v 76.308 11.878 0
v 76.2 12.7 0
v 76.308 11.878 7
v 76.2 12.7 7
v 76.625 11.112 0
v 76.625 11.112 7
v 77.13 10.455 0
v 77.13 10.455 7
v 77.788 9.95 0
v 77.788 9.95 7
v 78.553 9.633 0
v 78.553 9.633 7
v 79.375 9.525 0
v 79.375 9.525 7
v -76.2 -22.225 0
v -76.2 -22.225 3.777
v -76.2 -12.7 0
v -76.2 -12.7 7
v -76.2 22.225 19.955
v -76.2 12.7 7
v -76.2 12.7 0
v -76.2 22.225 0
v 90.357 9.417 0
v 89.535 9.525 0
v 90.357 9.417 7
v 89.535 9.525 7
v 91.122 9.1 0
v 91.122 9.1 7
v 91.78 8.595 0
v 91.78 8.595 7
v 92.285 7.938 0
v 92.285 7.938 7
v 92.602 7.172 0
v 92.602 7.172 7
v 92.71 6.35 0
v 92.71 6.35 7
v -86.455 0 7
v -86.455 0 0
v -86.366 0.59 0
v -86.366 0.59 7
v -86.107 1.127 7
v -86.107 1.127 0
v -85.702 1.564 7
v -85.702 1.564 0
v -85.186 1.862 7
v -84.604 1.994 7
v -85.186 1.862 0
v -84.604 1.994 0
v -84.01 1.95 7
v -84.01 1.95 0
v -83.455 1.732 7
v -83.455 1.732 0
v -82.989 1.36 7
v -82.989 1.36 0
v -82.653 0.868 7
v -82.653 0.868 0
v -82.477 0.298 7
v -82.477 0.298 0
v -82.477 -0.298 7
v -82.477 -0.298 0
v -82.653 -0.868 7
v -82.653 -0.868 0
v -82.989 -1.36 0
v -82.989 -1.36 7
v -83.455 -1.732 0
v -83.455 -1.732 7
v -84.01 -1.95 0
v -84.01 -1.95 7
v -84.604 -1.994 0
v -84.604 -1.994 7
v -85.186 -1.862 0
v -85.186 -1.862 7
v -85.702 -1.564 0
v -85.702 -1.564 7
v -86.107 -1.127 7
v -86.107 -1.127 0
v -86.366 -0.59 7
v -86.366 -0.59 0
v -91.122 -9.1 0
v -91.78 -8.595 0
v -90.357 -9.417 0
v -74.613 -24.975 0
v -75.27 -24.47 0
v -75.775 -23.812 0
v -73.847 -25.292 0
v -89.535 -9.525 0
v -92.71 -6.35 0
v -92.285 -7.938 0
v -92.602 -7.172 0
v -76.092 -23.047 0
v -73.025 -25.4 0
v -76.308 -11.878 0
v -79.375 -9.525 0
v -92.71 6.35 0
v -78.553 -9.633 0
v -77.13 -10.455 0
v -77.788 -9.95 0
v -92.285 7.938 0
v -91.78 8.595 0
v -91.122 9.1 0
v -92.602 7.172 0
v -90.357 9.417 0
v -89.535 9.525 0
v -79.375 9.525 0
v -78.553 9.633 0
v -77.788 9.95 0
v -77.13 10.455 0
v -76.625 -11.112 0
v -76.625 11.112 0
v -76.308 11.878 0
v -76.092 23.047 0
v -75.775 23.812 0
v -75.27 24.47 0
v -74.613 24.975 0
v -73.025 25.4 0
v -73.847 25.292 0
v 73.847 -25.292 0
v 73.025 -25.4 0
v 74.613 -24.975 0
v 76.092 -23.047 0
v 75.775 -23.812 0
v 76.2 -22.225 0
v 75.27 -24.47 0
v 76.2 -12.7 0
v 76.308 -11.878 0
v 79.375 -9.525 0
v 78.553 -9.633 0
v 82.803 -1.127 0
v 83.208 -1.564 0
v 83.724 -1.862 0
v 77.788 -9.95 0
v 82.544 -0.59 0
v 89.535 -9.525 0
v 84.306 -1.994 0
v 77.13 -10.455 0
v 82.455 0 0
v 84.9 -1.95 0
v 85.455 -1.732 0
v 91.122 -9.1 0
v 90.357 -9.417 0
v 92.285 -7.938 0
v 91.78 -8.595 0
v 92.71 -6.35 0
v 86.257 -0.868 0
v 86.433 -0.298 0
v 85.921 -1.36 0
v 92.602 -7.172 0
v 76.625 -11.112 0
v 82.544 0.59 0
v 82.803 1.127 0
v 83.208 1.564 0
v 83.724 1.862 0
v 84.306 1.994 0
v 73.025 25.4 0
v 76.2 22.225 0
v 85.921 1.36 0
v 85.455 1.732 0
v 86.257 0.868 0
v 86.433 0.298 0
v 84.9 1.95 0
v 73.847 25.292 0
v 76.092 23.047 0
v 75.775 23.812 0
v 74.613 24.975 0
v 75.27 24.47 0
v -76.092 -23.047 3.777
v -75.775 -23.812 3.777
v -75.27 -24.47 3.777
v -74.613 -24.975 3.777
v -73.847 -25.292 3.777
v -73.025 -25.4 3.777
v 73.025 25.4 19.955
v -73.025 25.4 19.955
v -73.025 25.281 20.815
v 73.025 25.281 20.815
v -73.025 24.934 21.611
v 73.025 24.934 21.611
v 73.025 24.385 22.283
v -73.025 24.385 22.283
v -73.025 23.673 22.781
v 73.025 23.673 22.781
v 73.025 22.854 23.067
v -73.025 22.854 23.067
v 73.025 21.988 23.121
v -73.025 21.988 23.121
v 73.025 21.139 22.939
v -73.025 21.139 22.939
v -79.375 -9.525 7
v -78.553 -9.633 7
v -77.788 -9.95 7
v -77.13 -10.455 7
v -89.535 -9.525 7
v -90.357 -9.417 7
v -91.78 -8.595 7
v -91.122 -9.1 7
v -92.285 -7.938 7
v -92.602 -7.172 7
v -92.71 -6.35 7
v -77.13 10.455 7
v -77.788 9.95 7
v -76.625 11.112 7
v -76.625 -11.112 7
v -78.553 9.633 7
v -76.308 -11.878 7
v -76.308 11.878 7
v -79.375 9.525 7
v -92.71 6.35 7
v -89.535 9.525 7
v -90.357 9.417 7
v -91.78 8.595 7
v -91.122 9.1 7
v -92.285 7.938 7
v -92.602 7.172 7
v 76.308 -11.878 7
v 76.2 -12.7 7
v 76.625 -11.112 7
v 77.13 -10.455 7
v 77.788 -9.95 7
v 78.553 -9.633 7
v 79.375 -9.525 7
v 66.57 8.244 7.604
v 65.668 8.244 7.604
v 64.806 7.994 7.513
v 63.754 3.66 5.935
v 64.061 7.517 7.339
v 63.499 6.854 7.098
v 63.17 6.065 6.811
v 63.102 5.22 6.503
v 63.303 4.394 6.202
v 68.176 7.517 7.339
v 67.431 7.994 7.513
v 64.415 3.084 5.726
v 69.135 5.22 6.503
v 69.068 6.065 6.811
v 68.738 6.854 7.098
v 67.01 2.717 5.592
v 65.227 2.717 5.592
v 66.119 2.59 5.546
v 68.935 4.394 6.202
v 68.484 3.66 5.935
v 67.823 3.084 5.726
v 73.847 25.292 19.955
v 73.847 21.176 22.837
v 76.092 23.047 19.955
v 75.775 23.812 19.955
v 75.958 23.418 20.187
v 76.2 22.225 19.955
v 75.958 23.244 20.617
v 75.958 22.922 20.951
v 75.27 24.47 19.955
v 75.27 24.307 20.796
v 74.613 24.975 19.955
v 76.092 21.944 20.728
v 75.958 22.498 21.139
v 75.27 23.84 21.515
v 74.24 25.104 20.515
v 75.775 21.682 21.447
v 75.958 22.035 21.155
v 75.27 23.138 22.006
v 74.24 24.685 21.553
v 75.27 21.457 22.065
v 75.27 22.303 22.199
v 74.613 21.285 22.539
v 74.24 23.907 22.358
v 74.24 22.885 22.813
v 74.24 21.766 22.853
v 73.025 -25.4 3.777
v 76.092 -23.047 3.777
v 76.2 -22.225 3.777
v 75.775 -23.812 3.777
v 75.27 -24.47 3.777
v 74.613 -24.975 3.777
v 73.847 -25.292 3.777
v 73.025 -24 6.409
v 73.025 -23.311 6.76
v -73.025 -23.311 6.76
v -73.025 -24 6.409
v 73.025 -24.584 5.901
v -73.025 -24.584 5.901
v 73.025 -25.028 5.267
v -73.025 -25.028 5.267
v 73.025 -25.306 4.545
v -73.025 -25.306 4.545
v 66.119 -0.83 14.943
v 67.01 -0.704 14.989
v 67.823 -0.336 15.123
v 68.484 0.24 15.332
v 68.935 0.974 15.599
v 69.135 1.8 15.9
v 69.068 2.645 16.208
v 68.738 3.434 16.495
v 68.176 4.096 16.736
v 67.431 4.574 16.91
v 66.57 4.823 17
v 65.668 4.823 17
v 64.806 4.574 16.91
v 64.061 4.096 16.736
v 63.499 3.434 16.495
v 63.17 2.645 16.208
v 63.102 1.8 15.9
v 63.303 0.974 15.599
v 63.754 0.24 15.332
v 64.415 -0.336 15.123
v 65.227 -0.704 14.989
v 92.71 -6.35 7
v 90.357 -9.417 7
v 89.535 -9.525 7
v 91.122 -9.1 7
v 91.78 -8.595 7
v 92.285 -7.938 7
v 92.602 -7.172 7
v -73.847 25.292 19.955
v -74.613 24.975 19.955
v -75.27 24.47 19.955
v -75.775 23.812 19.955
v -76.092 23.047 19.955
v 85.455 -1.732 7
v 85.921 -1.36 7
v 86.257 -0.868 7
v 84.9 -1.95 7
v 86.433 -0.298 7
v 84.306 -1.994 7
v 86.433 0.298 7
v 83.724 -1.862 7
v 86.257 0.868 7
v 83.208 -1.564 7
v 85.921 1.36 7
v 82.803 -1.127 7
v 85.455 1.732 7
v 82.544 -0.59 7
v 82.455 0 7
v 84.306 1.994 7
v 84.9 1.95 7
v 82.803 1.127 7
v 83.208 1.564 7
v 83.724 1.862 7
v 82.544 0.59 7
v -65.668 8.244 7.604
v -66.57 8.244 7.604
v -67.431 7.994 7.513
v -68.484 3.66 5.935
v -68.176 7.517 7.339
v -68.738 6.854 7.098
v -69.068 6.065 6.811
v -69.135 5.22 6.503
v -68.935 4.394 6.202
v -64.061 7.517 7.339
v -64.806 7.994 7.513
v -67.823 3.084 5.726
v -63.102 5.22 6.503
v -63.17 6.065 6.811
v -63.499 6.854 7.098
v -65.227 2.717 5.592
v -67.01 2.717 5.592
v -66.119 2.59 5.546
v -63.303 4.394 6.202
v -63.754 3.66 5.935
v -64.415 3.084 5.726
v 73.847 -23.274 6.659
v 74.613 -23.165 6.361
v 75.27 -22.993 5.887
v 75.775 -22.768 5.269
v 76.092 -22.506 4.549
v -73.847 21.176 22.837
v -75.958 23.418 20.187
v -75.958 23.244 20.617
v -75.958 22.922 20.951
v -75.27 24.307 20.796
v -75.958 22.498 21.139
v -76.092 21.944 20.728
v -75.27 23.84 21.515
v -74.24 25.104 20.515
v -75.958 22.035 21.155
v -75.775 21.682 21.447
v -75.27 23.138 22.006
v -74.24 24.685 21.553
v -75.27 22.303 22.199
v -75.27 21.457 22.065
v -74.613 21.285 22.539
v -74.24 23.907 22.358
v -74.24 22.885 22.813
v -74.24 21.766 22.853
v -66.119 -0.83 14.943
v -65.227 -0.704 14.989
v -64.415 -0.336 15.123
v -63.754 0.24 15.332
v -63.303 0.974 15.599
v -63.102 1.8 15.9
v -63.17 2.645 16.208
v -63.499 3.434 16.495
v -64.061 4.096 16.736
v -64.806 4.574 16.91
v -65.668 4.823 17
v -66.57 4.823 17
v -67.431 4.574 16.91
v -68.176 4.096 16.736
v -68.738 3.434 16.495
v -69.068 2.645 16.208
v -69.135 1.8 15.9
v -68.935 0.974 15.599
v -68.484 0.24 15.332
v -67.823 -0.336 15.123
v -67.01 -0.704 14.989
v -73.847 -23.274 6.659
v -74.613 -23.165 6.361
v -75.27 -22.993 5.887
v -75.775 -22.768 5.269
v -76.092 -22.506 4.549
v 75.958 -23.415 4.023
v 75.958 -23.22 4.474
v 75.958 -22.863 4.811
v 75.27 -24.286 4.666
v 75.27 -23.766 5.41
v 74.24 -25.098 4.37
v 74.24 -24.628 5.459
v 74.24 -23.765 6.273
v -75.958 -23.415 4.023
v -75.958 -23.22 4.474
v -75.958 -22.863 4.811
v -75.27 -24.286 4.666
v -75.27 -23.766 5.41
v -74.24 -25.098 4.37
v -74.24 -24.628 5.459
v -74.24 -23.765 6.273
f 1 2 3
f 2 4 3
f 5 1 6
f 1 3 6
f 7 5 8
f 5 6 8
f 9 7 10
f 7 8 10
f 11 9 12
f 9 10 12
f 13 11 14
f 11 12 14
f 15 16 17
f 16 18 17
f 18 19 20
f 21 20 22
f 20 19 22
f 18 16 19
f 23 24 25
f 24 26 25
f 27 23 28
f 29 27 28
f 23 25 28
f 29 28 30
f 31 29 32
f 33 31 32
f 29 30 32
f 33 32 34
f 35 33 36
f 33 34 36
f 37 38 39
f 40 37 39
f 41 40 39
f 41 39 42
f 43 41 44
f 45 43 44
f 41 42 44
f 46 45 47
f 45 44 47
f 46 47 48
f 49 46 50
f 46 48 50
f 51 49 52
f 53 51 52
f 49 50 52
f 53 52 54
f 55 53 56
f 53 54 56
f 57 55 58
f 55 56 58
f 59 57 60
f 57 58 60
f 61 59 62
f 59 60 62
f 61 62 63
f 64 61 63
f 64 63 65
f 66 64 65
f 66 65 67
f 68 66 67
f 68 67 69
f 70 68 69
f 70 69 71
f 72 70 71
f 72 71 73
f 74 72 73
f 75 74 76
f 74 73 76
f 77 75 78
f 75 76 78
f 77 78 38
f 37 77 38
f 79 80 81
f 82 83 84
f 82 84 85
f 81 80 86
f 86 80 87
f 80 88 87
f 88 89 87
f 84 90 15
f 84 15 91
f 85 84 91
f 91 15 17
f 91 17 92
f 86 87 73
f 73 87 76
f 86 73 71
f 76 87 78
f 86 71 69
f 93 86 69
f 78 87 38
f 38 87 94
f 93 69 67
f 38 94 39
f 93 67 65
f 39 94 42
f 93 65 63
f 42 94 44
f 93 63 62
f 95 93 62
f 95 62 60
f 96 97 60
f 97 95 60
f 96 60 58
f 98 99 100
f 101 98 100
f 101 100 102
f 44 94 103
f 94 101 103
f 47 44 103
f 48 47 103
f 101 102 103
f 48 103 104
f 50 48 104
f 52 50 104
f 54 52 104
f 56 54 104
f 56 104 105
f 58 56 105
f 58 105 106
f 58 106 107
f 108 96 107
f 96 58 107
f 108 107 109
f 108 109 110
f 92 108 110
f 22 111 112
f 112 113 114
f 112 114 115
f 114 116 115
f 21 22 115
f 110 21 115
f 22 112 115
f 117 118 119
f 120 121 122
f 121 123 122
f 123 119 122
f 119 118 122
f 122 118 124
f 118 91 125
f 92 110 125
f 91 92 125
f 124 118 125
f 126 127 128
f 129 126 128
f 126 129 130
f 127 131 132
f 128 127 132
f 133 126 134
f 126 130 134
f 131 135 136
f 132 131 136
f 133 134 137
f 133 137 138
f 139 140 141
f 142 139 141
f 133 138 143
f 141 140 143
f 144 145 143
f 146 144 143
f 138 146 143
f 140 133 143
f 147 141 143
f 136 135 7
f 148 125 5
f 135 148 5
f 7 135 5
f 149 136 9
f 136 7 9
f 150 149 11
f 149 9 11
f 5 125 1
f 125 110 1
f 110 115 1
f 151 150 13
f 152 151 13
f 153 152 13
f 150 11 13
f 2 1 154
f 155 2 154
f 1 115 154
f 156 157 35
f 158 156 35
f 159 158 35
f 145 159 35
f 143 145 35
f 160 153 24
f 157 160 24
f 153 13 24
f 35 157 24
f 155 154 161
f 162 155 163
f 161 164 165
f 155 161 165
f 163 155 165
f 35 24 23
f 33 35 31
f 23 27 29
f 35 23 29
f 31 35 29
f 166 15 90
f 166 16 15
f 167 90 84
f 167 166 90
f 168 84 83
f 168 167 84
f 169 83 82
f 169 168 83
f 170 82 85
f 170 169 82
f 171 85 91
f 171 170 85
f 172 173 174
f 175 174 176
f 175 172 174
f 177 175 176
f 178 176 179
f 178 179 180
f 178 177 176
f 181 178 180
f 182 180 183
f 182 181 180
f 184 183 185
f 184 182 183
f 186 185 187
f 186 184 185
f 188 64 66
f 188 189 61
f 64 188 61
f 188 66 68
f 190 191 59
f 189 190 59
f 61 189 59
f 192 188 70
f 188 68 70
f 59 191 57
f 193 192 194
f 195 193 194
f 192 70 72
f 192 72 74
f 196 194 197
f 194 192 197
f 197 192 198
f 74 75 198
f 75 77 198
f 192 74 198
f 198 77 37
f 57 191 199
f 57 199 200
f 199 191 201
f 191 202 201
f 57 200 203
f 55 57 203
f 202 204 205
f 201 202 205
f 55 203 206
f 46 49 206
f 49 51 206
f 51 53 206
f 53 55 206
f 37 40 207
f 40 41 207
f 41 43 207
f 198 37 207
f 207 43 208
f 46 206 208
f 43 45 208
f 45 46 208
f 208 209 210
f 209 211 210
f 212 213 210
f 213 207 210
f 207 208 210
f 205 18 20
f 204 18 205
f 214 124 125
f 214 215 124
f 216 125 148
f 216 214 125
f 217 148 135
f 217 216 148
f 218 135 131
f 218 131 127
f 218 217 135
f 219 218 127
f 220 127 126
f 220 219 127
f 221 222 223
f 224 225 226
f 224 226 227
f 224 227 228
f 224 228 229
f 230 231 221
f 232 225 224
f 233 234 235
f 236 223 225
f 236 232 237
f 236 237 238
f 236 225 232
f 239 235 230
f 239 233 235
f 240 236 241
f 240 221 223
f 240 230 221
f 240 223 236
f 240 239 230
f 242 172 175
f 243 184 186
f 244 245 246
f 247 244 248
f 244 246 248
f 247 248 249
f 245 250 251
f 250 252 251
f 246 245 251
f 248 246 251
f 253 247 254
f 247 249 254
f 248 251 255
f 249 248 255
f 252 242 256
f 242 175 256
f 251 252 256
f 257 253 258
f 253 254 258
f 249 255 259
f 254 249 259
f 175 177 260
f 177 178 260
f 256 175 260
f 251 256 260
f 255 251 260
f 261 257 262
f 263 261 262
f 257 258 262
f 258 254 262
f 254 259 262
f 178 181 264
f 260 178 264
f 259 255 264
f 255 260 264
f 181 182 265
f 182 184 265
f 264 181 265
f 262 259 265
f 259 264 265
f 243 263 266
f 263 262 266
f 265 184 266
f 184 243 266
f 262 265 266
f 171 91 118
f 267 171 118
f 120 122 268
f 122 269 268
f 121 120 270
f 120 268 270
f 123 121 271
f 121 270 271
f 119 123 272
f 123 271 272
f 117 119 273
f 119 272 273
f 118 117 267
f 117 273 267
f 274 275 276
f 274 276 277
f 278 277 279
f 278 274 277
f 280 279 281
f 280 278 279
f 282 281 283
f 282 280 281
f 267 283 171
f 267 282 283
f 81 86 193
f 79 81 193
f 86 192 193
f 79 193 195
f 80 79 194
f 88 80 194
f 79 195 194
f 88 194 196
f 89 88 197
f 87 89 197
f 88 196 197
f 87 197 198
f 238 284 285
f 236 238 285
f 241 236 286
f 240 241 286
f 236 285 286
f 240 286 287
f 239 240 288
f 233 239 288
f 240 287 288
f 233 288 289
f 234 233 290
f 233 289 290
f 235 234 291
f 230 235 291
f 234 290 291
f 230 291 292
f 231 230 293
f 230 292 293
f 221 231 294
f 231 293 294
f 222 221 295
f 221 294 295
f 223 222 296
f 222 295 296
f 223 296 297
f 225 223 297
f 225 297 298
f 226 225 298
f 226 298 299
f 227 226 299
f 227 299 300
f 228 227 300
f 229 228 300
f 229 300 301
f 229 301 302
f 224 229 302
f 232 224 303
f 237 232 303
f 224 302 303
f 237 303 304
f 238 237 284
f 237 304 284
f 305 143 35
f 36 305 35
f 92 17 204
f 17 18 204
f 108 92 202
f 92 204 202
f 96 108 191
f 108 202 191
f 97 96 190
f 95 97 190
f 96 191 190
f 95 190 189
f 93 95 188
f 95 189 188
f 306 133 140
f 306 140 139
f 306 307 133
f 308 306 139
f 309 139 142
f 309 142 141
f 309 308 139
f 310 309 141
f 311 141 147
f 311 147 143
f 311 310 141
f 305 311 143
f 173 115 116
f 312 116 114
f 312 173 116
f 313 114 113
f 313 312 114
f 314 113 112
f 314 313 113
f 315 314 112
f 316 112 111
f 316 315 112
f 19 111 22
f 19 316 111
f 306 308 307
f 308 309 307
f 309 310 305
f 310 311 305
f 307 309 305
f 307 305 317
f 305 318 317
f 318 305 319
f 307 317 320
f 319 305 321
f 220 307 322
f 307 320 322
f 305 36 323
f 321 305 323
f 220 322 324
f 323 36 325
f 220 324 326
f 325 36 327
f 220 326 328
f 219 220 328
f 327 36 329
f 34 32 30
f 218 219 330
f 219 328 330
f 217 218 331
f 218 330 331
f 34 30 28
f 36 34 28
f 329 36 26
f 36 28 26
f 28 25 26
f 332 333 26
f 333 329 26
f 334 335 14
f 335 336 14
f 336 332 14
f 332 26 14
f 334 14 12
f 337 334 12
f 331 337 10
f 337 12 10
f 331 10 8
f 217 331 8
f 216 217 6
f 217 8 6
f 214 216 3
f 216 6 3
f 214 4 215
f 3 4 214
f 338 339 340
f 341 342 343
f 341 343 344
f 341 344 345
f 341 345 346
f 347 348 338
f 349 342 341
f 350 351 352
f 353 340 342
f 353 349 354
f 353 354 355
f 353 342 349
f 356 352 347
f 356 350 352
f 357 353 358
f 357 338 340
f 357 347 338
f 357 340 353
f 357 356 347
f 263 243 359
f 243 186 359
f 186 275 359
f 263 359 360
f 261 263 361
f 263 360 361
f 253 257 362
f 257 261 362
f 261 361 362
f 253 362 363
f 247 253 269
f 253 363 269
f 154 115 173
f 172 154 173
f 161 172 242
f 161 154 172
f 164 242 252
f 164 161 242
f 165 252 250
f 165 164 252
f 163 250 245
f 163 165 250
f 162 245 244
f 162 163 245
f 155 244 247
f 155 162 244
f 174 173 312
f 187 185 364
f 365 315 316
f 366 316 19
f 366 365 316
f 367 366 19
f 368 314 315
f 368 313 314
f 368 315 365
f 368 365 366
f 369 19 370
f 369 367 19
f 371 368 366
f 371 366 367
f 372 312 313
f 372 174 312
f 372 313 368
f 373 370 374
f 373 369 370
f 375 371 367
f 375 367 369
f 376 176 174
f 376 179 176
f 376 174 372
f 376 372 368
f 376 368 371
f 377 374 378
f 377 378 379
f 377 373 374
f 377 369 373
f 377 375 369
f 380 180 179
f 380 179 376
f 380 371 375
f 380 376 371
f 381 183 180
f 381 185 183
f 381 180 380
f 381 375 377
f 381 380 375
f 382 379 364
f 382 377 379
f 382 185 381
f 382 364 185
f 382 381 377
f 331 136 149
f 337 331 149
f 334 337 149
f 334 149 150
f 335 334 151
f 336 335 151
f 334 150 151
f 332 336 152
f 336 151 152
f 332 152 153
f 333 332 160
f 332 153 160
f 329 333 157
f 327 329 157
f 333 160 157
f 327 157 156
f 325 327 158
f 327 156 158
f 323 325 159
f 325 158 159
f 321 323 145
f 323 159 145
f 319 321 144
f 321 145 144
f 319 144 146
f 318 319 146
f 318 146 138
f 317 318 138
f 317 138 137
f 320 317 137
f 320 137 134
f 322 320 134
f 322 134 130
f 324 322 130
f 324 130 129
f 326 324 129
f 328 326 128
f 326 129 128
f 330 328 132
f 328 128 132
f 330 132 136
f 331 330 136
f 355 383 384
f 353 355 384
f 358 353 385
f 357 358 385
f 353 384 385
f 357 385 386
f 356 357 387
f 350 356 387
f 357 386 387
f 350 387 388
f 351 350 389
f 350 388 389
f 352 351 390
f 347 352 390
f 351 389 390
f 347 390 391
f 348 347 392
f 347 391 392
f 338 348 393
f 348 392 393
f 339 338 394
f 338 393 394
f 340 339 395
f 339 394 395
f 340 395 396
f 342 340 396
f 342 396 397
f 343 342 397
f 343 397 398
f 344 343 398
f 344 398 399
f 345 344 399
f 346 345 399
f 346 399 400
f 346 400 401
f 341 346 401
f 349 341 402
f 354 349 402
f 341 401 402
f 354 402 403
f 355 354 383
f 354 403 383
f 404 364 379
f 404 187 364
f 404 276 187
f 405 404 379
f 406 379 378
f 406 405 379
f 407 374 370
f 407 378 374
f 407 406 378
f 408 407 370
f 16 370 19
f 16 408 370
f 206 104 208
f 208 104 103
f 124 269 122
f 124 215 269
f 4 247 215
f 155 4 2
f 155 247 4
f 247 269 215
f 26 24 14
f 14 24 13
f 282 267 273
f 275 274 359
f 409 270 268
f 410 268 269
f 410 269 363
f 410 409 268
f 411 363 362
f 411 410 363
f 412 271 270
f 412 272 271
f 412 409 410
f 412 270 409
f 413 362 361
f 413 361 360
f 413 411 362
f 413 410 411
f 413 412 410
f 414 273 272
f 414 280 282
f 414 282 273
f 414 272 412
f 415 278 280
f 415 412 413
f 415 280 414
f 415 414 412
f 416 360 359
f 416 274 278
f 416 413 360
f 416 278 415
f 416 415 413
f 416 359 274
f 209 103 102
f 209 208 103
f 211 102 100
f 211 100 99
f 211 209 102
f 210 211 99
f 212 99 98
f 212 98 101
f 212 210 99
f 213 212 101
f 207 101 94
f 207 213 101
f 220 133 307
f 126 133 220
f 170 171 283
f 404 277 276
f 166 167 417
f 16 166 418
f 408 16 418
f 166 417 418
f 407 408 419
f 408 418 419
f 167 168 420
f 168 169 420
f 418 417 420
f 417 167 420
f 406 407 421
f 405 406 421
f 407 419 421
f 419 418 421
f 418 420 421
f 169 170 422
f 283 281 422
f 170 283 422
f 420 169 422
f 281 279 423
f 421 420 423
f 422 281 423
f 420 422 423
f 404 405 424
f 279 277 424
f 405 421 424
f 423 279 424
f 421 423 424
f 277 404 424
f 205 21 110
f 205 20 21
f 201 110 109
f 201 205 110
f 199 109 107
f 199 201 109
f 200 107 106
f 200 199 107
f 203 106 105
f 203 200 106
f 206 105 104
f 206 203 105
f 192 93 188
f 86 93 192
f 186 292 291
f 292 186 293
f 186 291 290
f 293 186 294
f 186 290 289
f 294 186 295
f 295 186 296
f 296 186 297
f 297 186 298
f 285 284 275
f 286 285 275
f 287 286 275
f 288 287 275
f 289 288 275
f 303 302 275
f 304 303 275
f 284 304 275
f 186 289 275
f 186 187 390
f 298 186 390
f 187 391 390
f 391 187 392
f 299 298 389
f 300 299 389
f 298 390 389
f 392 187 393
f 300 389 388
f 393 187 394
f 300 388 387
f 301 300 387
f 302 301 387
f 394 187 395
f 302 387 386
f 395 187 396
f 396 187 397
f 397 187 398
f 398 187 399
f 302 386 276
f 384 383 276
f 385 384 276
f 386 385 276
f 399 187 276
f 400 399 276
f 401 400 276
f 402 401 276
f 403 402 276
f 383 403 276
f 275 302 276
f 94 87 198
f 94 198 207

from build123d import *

# Parameters (mm, degrees)
SKETCH1_W           = 152.4
SKETCH1_H           = 50.8
BOSS_EXTRUDE1_DEPTH = 6
BOSS_EXTRUDE2_DEPTH = 152.4
SKETCH7_W           = 16.51
SKETCH7_H           = 19.05
SKETCH7_R           = 2
BOSS_EXTRUDE3_DEPTH = 7
FILLET1_R           = 3.175
SKETCH8_R           = 3.025
CUT_EXTRUDE1_DEPTH  = 10


with BuildPart() as part:
    # Sketch1 → Boss-Extrude1 (new body)
    with BuildSketch(Plane.XY):
        Rectangle(SKETCH1_W, SKETCH1_H)
    extrude(amount=BOSS_EXTRUDE1_DEPTH)

    # Sketch5 → Boss-Extrude2 (add)
    with BuildSketch(Plane.ZY.offset(76.2)):
        Polygon((6, 25.4), (24.489687901, 25.4), (6, -25.4), align=None)
    extrude(amount=-BOSS_EXTRUDE2_DEPTH)

    # Sketch7 → Boss-Extrude3 (add)
    # profile 1 of 2: a face of its own
    with BuildSketch(Plane(origin=(0, 0, 0), x_dir=(-1, 0, 0), z_dir=(0, 0, -1))):
        with Locations((-84.455, 0)):
            Rectangle(SKETCH7_W, SKETCH7_H)
        with Locations((-84.455, 0)):
            Circle(SKETCH7_R, mode=Mode.SUBTRACT)
    # profile 2 of 2: a face of its own
    with BuildSketch(Plane(origin=(0, 0, 0), x_dir=(-1, 0, 0), z_dir=(0, 0, -1))):
        with Locations((84.455, 0)):
            Rectangle(SKETCH7_W, SKETCH7_H)
        with Locations((84.455, 0)):
            Circle(SKETCH7_R, mode=Mode.SUBTRACT)
    extrude(amount=-BOSS_EXTRUDE3_DEPTH)

    # Fillet1
    fillet1_edges = [part.edges().sort_by_distance(p)[0] for p in [
        (-76.2, 0, 15.24484395),
        (76.2, 0, 15.24484395),
        (0, 25.4, 24.489687901),
        (0, -25.4, 6),
        (76.2, -9.525, 3.5),
        (92.71, -9.525, 3.5),
        (92.71, 9.525, 3.5),
        (76.2, 9.525, 3.5),
        (-76.2, -9.525, 3.5),
        (-76.2, 9.525, 3.5),
        (-92.71, 9.525, 3.5),
        (-92.71, -9.525, 3.5),
        (76.2, -25.4, 3),
        (-76.2, -25.4, 3),
        (-76.2, 25.4, 12.24484395),
        (76.2, 25.4, 12.24484395),
    ]]
    fillet(fillet1_edges, radius=FILLET1_R)

    # Sketch8 → Cut-Extrude1 (cut)
    with BuildSketch(Plane(origin=(0, -4.899598401, 13.461535972), x_dir=(1, 0, 0), z_dir=(0, -0.3420201433256695, 0.9396926207859082))):
        with Locations(Location((-66.11875, 7.355813283, 0), (0, 0, 270))):
            Circle(SKETCH8_R)
        with Locations(Location((66.11875, 7.355813283, 0), (0, 0, 270))):
            Circle(SKETCH8_R)
    extrude(amount=-CUT_EXTRUDE1_DEPTH, mode=Mode.SUBTRACT)


solid = part.part
